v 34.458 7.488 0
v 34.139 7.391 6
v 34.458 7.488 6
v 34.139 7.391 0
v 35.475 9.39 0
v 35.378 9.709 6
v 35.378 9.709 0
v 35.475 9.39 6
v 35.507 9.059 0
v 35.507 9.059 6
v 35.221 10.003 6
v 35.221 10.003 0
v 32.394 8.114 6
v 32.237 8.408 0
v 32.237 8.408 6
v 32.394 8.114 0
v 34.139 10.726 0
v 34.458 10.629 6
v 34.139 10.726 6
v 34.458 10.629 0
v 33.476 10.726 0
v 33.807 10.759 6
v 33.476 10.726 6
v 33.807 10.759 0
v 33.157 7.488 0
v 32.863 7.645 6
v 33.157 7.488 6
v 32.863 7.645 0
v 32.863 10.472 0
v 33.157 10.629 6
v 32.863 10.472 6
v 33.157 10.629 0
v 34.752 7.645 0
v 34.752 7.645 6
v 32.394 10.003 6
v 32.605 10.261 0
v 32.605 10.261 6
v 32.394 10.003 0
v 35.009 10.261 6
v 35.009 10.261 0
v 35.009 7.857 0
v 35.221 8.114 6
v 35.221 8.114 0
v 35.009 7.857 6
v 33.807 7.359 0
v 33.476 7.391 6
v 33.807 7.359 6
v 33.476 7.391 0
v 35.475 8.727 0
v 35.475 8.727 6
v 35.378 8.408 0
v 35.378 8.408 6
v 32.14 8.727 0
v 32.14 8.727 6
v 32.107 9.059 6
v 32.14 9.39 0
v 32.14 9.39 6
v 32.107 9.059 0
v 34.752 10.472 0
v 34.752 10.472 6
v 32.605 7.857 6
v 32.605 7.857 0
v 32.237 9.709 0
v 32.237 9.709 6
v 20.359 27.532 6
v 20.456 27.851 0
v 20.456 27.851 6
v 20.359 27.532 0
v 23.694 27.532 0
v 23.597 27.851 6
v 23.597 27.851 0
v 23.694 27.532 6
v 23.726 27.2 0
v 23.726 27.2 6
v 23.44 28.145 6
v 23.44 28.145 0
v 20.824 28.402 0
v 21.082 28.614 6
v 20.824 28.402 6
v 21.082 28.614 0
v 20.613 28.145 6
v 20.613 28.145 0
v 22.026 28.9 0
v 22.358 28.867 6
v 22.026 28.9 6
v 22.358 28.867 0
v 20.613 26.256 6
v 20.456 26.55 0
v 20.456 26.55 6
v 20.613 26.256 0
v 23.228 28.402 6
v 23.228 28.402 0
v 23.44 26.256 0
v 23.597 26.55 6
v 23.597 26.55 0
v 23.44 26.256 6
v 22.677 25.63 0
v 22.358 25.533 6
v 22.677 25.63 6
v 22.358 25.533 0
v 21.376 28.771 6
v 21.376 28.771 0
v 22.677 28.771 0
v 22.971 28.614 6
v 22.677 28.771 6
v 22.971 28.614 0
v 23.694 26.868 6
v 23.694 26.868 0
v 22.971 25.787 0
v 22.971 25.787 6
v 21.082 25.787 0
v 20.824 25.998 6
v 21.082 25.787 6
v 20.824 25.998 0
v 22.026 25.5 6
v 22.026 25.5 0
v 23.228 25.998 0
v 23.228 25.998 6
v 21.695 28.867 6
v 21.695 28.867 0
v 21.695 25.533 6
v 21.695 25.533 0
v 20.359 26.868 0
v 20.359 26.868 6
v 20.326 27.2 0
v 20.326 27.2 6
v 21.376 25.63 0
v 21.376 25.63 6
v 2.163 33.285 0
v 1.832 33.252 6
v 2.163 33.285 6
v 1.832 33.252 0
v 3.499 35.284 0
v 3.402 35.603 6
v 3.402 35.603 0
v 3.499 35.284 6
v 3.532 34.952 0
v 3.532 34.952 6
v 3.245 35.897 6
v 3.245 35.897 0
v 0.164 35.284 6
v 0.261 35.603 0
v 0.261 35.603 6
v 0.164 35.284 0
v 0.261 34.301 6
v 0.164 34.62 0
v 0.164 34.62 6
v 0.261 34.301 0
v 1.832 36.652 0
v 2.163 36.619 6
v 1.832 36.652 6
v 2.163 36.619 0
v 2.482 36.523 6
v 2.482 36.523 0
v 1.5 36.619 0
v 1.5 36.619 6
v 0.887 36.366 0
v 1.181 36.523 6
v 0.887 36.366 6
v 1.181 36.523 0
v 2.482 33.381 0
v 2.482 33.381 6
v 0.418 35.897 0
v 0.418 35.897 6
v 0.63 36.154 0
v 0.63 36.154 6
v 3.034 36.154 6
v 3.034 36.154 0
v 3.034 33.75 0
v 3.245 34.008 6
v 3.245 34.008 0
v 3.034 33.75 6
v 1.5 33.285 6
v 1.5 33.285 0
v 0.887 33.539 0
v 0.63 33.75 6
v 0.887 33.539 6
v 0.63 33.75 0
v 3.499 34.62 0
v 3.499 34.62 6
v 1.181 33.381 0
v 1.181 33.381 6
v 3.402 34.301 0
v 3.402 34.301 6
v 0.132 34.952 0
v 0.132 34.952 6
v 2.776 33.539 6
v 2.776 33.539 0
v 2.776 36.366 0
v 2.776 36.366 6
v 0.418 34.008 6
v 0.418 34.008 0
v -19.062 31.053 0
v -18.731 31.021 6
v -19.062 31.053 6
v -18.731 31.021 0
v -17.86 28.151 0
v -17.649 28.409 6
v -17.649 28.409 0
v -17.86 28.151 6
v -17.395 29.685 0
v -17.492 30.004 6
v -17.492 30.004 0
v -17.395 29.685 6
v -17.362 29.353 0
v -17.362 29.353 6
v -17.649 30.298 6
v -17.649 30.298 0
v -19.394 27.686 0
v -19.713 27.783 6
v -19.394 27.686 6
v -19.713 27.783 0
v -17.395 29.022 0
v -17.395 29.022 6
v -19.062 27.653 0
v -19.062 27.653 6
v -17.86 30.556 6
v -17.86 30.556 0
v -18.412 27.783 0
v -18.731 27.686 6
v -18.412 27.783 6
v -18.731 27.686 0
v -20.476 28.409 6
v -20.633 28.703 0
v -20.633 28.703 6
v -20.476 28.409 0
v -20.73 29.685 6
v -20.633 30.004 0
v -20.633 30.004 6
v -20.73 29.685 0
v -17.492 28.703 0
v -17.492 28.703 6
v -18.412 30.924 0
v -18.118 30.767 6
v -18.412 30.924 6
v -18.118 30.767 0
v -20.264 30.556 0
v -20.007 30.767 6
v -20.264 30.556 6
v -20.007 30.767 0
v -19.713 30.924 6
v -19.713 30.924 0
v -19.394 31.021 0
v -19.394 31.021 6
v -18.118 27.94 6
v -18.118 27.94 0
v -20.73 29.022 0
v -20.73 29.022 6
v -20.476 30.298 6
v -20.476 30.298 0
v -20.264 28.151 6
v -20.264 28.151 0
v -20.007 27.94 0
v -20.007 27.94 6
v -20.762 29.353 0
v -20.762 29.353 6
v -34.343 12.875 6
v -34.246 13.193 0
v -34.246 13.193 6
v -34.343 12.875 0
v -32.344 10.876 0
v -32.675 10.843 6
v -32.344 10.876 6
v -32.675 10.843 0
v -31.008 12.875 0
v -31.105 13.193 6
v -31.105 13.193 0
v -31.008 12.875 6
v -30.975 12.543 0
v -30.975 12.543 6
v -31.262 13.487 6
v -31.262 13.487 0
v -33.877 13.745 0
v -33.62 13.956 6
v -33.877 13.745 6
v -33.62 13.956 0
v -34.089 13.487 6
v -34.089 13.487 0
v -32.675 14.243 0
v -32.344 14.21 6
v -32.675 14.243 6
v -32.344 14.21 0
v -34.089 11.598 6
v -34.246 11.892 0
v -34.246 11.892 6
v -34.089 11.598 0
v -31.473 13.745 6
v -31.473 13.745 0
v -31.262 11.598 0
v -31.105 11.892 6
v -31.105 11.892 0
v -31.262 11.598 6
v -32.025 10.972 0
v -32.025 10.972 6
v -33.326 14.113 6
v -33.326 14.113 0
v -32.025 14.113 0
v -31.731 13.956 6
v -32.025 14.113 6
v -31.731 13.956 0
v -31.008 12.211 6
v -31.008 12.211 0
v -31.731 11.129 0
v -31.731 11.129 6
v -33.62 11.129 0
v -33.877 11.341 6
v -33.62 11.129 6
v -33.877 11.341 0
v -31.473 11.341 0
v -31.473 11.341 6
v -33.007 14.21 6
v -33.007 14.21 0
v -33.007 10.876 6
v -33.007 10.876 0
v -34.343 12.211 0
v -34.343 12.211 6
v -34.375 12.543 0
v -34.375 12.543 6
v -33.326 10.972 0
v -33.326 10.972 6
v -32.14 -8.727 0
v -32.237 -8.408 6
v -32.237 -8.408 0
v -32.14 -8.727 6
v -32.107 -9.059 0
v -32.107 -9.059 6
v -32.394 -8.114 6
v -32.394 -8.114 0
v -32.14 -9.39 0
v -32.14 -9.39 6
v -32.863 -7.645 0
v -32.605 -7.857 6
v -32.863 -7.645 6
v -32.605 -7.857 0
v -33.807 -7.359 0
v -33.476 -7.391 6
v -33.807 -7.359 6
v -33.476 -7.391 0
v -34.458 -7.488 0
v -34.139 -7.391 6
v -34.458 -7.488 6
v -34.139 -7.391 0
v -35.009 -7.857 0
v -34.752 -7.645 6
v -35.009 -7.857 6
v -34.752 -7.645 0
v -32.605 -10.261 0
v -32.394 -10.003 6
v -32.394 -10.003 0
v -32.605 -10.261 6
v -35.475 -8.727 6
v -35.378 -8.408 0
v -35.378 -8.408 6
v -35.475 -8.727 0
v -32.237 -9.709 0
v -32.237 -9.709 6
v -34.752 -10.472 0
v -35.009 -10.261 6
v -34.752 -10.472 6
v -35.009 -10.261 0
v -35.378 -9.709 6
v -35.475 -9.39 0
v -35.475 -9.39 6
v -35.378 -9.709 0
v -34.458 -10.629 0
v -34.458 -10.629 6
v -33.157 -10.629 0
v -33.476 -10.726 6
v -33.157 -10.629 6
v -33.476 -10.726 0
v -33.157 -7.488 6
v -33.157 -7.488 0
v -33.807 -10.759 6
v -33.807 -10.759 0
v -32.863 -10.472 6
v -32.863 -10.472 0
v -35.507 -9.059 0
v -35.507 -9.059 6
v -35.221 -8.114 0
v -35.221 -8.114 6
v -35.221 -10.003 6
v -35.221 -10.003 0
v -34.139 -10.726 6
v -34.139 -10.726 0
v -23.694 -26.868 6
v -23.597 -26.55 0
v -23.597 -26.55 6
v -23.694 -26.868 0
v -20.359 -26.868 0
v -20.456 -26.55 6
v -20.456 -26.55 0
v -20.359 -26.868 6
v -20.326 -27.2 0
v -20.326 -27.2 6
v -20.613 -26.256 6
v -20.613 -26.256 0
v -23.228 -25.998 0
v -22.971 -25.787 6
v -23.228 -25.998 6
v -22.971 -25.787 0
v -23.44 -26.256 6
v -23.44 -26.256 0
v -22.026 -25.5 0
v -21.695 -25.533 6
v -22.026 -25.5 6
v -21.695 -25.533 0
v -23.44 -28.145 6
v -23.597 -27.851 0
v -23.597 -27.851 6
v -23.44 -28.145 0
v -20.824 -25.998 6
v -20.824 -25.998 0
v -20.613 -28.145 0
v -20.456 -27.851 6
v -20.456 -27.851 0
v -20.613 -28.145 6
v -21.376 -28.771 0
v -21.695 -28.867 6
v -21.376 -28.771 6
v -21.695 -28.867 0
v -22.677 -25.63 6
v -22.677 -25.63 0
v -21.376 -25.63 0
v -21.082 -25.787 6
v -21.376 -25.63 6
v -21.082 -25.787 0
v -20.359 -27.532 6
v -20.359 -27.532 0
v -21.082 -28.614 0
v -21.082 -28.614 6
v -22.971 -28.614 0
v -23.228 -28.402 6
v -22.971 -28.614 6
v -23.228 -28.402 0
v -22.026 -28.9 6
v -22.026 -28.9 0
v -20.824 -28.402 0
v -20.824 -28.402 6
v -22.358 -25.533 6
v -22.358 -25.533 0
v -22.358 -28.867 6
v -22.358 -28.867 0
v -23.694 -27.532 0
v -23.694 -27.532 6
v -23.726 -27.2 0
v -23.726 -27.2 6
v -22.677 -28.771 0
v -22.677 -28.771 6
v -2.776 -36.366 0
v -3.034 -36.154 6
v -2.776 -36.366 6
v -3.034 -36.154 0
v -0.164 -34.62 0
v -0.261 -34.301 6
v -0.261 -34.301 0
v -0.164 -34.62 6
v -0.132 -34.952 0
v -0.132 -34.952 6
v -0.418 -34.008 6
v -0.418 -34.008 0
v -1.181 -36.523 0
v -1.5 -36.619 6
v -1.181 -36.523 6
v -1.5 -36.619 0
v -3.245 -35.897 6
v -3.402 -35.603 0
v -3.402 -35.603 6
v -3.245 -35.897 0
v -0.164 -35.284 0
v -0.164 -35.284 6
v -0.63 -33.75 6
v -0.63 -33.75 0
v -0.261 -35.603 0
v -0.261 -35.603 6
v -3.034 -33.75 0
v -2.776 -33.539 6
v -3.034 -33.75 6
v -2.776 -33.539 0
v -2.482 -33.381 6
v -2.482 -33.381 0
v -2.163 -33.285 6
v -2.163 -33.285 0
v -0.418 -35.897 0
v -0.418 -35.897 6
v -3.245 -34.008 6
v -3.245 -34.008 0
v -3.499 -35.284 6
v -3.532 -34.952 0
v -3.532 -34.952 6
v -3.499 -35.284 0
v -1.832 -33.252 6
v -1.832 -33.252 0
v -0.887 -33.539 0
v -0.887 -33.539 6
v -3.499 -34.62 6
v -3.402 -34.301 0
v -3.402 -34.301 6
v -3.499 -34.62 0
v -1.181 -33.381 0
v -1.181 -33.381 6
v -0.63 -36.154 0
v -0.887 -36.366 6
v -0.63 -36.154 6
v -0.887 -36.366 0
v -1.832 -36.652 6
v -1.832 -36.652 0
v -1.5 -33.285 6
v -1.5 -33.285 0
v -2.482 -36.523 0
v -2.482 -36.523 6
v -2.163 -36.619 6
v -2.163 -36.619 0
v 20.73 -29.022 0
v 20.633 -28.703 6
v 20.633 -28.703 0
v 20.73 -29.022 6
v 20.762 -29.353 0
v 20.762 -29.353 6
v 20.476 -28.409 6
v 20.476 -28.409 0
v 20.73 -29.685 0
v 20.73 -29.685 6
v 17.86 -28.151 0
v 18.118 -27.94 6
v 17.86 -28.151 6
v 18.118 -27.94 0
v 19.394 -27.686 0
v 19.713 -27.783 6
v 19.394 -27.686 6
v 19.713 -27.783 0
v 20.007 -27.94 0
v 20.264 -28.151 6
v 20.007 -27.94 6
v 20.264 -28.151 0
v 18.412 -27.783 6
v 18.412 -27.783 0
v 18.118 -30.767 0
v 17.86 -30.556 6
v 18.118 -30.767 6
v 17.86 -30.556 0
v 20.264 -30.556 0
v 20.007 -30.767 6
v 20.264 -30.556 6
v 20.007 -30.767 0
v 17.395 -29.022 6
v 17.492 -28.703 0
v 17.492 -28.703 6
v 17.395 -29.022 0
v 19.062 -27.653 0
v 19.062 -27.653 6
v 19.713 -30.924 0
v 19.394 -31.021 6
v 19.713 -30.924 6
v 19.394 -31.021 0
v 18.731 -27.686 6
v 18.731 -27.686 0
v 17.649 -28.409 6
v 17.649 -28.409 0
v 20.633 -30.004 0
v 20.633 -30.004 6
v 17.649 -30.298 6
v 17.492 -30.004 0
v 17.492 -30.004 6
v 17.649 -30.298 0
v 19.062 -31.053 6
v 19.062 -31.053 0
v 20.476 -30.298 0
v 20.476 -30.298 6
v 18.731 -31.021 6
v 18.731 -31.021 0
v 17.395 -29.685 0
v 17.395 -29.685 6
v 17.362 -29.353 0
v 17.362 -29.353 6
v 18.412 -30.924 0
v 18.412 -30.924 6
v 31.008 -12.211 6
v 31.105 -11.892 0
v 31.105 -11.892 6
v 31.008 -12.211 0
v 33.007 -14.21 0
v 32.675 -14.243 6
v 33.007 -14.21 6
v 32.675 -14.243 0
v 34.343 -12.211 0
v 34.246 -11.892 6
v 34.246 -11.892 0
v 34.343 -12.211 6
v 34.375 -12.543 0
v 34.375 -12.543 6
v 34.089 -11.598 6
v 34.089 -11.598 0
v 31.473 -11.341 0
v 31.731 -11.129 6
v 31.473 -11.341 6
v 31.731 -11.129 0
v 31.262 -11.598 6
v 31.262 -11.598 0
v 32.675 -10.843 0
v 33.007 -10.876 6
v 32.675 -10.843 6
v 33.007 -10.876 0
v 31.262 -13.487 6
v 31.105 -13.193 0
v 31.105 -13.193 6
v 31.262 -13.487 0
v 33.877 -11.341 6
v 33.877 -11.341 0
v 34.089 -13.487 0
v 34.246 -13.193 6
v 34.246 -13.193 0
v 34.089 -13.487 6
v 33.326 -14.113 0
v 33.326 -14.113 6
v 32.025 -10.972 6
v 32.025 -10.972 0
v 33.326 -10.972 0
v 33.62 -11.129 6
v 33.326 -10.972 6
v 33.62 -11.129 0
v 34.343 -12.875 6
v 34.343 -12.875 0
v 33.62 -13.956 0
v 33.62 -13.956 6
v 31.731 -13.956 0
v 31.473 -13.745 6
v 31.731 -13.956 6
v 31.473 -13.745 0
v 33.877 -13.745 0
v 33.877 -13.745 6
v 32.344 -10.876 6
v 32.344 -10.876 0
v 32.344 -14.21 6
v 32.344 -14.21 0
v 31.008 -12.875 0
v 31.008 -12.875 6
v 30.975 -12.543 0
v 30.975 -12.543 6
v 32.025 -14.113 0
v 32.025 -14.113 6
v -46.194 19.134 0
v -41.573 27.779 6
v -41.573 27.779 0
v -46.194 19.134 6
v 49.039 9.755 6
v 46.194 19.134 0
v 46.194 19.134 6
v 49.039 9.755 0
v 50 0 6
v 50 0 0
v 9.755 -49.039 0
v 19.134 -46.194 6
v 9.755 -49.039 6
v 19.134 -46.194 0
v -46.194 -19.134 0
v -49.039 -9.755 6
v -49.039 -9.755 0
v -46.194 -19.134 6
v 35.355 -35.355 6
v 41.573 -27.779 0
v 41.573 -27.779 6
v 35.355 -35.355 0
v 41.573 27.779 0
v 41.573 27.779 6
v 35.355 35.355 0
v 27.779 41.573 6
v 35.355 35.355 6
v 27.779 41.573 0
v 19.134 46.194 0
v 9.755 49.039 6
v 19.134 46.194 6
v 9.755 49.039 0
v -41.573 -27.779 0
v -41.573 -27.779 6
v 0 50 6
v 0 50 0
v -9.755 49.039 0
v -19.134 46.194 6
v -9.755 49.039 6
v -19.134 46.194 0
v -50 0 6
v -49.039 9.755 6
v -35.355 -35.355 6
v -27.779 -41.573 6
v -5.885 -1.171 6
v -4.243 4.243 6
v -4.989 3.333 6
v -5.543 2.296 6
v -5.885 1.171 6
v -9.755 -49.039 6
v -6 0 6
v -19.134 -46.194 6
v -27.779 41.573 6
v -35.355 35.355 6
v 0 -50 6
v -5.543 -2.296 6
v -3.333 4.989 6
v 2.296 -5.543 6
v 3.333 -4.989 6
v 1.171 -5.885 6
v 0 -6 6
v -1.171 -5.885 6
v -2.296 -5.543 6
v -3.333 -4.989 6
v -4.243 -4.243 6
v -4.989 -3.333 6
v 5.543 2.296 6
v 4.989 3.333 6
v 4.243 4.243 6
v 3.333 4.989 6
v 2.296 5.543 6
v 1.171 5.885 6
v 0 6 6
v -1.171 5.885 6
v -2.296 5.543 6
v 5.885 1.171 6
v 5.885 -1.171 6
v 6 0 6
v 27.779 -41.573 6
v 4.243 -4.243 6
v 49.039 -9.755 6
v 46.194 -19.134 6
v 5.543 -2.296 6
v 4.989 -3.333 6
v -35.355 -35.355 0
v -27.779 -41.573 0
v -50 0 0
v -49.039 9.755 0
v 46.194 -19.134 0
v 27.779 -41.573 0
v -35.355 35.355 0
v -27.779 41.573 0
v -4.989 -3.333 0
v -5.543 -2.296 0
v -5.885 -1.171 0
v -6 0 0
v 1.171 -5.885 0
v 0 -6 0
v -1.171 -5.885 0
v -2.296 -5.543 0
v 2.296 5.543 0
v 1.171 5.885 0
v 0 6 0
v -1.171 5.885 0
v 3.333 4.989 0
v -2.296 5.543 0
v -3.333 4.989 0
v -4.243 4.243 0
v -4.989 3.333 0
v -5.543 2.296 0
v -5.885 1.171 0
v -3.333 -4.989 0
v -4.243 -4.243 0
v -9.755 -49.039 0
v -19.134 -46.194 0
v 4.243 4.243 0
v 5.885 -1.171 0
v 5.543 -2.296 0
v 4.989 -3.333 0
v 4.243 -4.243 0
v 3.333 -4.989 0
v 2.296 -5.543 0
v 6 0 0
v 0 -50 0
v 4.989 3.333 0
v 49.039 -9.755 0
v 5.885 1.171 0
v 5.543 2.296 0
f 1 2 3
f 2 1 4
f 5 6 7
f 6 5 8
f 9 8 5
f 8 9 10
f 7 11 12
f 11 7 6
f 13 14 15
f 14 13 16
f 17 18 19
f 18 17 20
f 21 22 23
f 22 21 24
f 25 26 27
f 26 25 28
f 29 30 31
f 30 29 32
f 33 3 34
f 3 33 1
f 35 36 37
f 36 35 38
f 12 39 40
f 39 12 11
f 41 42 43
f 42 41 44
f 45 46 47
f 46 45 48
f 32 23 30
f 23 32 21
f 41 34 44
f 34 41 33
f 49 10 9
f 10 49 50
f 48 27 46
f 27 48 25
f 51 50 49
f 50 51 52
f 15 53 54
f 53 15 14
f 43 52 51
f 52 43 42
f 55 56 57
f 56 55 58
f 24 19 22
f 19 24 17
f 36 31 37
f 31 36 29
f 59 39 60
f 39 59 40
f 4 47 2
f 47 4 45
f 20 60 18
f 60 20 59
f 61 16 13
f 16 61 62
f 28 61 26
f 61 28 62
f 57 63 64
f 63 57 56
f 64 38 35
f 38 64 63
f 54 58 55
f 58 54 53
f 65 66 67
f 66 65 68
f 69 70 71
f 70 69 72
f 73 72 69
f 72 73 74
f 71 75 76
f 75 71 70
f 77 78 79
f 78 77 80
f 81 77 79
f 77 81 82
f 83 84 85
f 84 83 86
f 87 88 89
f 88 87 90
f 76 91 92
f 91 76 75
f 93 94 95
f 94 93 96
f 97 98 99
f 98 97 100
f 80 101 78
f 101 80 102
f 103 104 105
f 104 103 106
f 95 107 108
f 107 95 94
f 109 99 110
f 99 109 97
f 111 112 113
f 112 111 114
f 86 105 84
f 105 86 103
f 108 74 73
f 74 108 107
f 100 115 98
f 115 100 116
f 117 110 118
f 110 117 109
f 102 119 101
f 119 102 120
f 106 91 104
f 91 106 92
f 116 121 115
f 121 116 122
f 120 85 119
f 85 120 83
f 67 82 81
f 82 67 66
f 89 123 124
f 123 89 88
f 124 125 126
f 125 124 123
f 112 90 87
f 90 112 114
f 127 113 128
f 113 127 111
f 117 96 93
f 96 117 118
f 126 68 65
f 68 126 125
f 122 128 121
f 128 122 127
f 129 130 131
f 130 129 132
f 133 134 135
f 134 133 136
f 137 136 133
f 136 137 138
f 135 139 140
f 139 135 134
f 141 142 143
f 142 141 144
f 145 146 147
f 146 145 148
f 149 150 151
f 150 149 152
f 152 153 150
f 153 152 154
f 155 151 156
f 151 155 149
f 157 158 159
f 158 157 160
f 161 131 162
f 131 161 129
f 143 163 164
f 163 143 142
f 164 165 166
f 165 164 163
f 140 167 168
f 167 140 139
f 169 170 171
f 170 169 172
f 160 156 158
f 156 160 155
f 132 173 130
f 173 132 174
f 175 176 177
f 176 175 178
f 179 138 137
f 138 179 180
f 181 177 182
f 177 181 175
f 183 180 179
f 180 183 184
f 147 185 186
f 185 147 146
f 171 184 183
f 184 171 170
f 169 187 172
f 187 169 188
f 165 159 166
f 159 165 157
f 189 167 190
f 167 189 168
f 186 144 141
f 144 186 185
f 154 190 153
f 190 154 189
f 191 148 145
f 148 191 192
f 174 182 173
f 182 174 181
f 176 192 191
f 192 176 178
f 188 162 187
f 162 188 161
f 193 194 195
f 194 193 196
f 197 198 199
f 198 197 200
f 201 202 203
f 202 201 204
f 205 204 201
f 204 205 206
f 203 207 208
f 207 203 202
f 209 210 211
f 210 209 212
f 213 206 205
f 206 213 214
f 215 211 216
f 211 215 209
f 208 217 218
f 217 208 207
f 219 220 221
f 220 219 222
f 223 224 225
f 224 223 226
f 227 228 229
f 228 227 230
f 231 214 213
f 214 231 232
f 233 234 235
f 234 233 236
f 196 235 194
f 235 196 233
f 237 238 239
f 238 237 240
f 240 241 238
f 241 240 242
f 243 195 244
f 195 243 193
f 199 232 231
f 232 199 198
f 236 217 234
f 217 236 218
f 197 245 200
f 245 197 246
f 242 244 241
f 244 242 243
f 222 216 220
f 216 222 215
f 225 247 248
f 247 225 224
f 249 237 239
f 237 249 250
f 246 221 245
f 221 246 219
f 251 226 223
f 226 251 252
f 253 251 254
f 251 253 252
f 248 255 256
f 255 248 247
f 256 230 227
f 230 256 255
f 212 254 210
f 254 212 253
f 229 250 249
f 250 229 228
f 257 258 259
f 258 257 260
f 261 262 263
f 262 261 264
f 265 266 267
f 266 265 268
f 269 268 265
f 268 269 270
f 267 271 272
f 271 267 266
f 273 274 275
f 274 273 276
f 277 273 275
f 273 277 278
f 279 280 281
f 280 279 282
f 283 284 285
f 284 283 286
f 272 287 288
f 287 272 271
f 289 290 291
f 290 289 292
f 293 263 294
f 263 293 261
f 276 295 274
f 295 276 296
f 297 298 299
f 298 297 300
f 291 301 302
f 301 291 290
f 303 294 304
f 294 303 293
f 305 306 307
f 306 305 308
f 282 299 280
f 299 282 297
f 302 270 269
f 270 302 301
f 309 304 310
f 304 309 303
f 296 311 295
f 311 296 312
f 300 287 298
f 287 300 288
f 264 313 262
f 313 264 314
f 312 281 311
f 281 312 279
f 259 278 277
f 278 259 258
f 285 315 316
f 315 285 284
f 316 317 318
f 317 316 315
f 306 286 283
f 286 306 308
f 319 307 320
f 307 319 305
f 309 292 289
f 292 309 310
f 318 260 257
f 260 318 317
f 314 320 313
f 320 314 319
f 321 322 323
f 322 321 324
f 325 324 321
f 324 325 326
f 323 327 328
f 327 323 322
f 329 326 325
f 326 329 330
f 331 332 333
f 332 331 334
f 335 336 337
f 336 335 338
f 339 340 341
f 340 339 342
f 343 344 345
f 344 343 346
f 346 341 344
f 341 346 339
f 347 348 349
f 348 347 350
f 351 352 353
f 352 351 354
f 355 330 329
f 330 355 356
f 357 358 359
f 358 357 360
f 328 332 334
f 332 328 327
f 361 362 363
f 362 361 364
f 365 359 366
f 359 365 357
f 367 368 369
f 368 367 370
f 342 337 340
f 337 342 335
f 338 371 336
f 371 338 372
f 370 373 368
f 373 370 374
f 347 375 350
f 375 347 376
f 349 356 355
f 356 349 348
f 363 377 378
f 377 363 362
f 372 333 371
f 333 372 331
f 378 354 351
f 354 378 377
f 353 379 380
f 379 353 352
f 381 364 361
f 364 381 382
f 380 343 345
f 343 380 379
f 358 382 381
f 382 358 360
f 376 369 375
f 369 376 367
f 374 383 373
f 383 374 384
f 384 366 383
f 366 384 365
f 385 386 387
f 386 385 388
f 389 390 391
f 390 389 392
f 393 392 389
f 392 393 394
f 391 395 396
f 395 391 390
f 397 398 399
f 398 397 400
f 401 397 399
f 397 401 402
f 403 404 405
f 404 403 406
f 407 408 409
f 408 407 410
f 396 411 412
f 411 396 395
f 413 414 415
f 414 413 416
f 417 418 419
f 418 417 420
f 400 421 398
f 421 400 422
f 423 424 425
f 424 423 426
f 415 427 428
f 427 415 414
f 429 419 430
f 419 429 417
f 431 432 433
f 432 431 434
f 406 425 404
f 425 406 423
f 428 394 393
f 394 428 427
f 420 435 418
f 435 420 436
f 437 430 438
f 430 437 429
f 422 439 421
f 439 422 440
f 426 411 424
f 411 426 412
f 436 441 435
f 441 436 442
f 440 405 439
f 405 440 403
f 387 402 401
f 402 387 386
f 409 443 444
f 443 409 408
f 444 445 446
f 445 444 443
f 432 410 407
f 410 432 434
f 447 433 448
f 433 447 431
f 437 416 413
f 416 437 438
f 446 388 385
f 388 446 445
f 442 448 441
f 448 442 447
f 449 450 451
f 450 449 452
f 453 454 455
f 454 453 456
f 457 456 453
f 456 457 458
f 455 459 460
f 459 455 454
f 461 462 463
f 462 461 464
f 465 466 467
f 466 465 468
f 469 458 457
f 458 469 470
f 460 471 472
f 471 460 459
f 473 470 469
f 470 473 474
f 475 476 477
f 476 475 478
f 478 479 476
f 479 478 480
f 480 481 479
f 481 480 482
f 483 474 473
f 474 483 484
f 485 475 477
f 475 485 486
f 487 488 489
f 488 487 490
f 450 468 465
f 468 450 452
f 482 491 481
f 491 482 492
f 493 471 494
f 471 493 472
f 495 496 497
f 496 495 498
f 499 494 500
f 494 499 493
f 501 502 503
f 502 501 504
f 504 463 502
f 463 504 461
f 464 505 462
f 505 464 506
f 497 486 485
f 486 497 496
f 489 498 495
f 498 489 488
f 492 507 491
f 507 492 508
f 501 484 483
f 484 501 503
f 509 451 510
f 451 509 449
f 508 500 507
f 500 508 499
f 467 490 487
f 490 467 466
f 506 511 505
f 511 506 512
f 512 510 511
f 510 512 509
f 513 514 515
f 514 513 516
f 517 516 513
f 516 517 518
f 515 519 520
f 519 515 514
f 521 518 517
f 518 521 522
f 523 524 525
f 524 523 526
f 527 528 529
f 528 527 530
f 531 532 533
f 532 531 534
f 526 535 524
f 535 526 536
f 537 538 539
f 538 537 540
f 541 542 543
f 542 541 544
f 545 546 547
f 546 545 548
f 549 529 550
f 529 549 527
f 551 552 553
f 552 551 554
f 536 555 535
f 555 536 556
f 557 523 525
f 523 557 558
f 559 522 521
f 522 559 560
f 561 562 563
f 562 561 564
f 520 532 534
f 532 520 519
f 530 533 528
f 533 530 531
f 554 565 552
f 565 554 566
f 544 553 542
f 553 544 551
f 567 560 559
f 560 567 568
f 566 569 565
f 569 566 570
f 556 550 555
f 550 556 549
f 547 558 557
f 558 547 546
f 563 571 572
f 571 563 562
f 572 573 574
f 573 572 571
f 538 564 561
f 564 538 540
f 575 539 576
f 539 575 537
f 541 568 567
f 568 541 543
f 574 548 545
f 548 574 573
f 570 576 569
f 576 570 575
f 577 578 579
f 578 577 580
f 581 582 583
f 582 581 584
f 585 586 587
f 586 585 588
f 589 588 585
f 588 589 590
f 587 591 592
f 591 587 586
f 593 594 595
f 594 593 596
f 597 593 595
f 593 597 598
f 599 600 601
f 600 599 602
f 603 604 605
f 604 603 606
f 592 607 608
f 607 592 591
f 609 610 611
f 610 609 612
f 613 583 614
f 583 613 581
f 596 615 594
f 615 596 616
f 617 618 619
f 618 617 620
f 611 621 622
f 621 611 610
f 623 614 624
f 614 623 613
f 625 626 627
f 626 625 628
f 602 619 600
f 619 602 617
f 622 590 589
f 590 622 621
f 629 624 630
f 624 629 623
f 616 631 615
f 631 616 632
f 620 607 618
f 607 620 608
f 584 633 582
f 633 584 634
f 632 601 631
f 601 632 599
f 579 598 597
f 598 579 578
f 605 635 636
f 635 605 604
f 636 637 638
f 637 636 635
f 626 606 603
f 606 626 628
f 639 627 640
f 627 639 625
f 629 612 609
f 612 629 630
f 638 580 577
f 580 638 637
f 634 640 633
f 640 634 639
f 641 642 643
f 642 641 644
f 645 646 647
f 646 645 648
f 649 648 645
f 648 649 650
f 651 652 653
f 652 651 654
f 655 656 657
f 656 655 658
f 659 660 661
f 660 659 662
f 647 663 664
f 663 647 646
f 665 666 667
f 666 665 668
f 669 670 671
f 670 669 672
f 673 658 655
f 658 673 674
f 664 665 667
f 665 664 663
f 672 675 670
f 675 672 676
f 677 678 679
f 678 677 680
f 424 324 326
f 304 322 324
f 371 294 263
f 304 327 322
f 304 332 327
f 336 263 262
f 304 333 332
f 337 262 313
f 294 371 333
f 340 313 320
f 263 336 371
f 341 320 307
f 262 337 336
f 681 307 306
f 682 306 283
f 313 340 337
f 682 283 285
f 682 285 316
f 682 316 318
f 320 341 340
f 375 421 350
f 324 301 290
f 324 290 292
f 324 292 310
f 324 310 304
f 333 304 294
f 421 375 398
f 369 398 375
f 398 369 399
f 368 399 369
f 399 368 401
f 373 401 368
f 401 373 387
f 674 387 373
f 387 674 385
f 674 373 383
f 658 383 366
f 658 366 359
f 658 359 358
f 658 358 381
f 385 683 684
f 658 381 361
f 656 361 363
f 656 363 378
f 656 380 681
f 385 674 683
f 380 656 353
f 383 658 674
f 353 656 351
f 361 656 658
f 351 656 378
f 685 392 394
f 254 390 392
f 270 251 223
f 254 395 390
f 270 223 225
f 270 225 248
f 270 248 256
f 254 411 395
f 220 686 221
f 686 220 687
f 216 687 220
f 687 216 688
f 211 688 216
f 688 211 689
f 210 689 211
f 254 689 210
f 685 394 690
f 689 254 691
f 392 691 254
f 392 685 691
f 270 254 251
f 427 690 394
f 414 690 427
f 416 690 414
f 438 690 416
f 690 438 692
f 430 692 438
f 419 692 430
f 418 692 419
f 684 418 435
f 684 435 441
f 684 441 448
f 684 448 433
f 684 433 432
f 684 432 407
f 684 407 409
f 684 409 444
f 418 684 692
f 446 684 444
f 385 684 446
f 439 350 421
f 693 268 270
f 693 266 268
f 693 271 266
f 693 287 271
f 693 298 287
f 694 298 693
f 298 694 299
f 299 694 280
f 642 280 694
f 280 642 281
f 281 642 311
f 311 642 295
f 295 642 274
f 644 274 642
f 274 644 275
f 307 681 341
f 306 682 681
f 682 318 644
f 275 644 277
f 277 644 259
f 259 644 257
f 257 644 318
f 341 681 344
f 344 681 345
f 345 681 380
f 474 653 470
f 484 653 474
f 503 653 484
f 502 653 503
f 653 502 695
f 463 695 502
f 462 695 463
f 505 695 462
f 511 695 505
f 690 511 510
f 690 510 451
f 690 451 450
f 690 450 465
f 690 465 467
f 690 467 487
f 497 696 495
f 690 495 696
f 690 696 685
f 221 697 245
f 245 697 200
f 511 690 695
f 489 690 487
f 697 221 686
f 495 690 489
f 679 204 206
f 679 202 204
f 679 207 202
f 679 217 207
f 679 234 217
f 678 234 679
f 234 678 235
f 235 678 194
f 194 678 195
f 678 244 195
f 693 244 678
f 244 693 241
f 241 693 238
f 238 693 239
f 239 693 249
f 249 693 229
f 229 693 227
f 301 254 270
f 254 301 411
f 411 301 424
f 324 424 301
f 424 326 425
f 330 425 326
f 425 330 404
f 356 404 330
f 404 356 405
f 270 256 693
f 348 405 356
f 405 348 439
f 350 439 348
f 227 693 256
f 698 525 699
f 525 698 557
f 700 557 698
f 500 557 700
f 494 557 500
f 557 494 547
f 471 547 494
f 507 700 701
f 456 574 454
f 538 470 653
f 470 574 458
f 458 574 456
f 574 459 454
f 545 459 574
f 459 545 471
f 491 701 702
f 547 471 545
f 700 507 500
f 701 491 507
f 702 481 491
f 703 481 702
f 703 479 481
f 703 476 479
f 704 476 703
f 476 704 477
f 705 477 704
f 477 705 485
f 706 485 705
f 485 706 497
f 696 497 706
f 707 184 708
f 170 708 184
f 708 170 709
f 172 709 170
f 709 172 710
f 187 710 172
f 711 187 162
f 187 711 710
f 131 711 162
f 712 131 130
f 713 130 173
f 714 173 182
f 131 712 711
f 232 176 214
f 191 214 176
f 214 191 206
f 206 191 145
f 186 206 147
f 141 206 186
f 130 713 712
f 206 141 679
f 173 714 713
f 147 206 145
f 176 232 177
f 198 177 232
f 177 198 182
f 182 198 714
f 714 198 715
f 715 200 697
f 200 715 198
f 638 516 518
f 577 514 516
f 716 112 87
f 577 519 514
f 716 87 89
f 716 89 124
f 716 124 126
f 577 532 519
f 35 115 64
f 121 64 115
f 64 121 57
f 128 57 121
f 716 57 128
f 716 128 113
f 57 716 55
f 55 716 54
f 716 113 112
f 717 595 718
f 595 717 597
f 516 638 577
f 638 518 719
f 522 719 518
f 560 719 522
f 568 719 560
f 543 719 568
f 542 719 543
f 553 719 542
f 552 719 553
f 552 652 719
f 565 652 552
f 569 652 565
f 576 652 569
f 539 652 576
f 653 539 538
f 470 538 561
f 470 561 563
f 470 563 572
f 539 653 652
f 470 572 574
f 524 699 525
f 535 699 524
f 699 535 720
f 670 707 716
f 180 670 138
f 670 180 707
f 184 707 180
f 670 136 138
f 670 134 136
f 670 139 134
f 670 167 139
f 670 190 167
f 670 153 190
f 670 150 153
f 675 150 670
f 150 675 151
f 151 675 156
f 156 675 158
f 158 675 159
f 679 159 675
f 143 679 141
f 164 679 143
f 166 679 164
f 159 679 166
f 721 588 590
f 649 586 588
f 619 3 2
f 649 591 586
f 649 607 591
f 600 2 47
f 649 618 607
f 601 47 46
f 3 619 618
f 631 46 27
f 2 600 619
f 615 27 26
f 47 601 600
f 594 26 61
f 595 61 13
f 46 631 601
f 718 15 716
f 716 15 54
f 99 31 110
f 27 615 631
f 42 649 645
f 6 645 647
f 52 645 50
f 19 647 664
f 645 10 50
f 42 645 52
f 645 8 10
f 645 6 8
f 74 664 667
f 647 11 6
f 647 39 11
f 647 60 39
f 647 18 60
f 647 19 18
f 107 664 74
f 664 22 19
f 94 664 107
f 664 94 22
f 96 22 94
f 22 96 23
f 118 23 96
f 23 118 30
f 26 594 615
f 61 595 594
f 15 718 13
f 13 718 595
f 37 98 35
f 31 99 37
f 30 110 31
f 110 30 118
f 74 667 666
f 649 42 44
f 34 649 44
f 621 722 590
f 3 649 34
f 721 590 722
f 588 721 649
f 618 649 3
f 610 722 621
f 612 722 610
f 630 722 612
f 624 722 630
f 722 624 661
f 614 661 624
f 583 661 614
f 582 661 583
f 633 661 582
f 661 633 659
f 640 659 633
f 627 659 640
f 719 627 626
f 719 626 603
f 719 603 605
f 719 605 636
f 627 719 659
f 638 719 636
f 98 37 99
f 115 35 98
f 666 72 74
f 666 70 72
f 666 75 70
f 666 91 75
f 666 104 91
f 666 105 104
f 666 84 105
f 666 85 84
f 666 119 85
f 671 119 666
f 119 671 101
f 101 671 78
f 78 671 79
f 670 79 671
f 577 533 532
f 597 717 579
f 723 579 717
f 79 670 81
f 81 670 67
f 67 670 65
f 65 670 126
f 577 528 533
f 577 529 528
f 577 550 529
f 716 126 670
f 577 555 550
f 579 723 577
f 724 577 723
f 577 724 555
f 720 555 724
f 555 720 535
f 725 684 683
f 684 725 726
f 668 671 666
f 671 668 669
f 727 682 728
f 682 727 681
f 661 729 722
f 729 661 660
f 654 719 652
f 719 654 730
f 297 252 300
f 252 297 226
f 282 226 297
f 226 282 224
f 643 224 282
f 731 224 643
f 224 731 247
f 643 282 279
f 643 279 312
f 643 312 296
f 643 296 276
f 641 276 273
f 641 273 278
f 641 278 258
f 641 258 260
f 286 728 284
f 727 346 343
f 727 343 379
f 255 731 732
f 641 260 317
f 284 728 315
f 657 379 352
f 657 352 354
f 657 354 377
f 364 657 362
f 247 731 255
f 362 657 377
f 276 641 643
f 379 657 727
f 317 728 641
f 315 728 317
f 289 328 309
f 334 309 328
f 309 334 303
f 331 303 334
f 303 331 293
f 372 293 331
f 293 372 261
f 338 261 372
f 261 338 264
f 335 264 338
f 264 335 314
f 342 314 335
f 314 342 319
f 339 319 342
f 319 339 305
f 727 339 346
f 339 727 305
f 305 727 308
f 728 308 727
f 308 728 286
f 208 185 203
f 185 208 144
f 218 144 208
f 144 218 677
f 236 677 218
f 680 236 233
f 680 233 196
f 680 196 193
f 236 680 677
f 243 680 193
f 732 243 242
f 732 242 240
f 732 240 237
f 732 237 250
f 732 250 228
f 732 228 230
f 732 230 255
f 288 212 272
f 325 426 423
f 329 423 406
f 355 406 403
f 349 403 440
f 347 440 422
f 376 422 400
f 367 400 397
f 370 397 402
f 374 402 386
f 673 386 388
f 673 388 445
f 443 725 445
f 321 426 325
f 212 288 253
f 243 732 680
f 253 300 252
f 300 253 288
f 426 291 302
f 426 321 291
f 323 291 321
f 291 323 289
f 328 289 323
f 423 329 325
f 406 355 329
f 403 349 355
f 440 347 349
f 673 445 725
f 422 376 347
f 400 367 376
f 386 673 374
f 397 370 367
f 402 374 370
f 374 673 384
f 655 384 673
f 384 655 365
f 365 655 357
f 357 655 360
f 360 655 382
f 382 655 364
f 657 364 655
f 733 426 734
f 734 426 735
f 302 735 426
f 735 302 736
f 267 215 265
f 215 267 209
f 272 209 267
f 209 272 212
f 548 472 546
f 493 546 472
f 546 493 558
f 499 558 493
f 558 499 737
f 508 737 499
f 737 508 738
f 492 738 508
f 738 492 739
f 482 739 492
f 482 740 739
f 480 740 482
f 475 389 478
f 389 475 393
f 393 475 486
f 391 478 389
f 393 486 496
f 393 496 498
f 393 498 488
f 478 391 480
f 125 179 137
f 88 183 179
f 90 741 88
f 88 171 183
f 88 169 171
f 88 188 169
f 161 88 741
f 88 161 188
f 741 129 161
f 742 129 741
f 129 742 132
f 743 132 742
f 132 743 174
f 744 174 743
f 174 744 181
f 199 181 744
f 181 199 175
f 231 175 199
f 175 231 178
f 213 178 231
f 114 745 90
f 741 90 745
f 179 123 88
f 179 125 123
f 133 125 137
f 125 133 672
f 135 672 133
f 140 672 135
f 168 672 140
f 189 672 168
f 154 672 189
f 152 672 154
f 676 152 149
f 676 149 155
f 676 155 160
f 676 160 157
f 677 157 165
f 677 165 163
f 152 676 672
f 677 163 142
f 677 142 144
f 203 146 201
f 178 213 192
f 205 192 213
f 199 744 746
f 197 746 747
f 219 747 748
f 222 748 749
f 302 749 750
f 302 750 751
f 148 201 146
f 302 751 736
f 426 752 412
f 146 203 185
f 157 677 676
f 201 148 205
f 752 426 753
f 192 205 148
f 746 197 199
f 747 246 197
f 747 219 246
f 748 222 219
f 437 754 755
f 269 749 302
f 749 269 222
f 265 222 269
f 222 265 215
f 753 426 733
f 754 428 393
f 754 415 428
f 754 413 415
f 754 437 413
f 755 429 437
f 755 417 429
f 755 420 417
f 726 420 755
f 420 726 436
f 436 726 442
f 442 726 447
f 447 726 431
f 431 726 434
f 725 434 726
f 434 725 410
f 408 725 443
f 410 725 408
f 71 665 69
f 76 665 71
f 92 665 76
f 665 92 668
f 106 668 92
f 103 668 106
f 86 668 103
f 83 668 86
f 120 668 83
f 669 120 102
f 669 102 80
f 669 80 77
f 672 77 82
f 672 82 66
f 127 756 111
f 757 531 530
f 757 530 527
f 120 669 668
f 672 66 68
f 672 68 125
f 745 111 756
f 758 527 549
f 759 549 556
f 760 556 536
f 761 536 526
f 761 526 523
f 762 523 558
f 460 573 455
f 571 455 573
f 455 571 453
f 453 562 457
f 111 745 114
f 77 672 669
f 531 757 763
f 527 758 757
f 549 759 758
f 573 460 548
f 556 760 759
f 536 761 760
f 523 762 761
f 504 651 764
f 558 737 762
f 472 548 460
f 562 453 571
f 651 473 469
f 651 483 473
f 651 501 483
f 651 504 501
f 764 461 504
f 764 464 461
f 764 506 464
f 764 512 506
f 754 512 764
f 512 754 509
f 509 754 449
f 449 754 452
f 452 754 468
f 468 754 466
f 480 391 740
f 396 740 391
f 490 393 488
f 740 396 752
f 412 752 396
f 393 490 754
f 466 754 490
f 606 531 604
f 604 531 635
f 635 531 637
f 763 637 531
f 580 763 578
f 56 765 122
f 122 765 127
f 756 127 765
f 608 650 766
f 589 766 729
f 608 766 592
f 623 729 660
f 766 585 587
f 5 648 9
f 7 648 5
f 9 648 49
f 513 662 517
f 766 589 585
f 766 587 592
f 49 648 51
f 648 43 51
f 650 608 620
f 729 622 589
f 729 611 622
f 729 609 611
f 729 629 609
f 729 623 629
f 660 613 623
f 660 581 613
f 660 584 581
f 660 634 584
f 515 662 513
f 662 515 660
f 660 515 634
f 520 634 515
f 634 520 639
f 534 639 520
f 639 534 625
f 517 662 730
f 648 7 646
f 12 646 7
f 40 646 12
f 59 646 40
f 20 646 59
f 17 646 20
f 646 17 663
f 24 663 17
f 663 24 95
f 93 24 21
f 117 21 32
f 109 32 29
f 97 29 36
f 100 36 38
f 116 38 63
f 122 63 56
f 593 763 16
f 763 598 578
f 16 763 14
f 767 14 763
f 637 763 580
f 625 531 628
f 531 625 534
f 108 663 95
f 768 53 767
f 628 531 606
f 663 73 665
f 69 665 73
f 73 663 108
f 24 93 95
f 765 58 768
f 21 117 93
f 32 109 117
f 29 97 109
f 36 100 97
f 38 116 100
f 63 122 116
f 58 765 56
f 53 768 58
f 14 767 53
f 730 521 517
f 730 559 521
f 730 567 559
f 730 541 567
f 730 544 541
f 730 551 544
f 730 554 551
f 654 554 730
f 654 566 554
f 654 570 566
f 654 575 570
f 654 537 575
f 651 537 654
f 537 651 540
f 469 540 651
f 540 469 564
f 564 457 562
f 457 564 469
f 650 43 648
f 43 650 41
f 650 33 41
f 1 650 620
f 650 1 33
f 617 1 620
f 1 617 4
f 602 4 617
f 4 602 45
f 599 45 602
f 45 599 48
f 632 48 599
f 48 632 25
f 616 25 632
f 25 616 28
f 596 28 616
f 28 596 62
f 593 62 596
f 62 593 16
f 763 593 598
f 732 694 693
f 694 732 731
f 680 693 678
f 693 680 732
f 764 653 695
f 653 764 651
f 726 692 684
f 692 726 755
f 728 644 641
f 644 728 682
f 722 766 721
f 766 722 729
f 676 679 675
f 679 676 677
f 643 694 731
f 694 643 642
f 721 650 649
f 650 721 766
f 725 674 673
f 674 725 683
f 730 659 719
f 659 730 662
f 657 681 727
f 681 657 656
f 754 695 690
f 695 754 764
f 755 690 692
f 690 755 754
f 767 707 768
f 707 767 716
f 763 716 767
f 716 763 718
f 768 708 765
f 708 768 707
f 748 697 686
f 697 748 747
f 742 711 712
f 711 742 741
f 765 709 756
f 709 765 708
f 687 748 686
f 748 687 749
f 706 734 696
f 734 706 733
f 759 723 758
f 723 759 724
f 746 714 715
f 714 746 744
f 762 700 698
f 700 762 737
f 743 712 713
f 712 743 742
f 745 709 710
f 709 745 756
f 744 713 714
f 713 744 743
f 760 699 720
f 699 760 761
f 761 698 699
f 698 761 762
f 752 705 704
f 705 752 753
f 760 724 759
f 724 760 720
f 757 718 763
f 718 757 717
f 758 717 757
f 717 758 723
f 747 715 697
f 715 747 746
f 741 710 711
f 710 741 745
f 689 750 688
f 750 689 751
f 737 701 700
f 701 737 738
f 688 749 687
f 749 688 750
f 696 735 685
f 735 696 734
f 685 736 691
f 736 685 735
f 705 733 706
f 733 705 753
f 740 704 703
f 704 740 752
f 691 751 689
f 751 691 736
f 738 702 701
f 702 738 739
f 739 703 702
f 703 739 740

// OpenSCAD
$fn = 32;

// ----------------------------------------------------------------------
// Flange Ø100 x 6
// 10 holes on a Ø70 bolt circle, bolted joints
// ----------------------------------------------------------------------

// --- parameters (mm) ---
flange_d = 100;  // outside diameter of the flange
thickness = 6;   // flange thickness
holes = 10;      // number of bolt holes
pcd = 70;        // bolt circle diameter
start_deg = 15;  // angle of the first hole, from +X
hole_d = 3.4;    // bolt hole diameter
bore_d = 12;     // central through bore
hub_d = 24;      // hub outside diameter
hub_h = 0;       // hub height above the flange face (0 = no hub)

// --- derived feature positions (mm) ---
height = thickness + hub_h;  // = 6   overall height of the part
pcd_r = pcd / 2;             // = 35   bolt circle radius
hole_step = 360 / holes;     // = 36   angular pitch
feature_centers = [
  [pcd_r * cos(start_deg + 0 * hole_step), pcd_r * sin(start_deg + 0 * hole_step)],
  [pcd_r * cos(start_deg + 1 * hole_step), pcd_r * sin(start_deg + 1 * hole_step)],
  [pcd_r * cos(start_deg + 2 * hole_step), pcd_r * sin(start_deg + 2 * hole_step)],
  [pcd_r * cos(start_deg + 3 * hole_step), pcd_r * sin(start_deg + 3 * hole_step)],
  [pcd_r * cos(start_deg + 4 * hole_step), pcd_r * sin(start_deg + 4 * hole_step)],
  [pcd_r * cos(start_deg + 5 * hole_step), pcd_r * sin(start_deg + 5 * hole_step)],
  [pcd_r * cos(start_deg + 6 * hole_step), pcd_r * sin(start_deg + 6 * hole_step)],
  [pcd_r * cos(start_deg + 7 * hole_step), pcd_r * sin(start_deg + 7 * hole_step)],
  [pcd_r * cos(start_deg + 8 * hole_step), pcd_r * sin(start_deg + 8 * hole_step)],
  [pcd_r * cos(start_deg + 9 * hole_step), pcd_r * sin(start_deg + 9 * hole_step)]
];   // bolt hole centres on the pitch circle

// flange disc, every hole and the bore cut straight through
difference() {
  union() {
    cylinder(d = flange_d, h = thickness);
  }
  translate([0, 0, -1]) cylinder(d = bore_d, h = height + 2);  // bore, through
  for (centre = feature_centers)
    translate([centre[0], centre[1], -1]) cylinder(d = hole_d, h = thickness + 2);
}
